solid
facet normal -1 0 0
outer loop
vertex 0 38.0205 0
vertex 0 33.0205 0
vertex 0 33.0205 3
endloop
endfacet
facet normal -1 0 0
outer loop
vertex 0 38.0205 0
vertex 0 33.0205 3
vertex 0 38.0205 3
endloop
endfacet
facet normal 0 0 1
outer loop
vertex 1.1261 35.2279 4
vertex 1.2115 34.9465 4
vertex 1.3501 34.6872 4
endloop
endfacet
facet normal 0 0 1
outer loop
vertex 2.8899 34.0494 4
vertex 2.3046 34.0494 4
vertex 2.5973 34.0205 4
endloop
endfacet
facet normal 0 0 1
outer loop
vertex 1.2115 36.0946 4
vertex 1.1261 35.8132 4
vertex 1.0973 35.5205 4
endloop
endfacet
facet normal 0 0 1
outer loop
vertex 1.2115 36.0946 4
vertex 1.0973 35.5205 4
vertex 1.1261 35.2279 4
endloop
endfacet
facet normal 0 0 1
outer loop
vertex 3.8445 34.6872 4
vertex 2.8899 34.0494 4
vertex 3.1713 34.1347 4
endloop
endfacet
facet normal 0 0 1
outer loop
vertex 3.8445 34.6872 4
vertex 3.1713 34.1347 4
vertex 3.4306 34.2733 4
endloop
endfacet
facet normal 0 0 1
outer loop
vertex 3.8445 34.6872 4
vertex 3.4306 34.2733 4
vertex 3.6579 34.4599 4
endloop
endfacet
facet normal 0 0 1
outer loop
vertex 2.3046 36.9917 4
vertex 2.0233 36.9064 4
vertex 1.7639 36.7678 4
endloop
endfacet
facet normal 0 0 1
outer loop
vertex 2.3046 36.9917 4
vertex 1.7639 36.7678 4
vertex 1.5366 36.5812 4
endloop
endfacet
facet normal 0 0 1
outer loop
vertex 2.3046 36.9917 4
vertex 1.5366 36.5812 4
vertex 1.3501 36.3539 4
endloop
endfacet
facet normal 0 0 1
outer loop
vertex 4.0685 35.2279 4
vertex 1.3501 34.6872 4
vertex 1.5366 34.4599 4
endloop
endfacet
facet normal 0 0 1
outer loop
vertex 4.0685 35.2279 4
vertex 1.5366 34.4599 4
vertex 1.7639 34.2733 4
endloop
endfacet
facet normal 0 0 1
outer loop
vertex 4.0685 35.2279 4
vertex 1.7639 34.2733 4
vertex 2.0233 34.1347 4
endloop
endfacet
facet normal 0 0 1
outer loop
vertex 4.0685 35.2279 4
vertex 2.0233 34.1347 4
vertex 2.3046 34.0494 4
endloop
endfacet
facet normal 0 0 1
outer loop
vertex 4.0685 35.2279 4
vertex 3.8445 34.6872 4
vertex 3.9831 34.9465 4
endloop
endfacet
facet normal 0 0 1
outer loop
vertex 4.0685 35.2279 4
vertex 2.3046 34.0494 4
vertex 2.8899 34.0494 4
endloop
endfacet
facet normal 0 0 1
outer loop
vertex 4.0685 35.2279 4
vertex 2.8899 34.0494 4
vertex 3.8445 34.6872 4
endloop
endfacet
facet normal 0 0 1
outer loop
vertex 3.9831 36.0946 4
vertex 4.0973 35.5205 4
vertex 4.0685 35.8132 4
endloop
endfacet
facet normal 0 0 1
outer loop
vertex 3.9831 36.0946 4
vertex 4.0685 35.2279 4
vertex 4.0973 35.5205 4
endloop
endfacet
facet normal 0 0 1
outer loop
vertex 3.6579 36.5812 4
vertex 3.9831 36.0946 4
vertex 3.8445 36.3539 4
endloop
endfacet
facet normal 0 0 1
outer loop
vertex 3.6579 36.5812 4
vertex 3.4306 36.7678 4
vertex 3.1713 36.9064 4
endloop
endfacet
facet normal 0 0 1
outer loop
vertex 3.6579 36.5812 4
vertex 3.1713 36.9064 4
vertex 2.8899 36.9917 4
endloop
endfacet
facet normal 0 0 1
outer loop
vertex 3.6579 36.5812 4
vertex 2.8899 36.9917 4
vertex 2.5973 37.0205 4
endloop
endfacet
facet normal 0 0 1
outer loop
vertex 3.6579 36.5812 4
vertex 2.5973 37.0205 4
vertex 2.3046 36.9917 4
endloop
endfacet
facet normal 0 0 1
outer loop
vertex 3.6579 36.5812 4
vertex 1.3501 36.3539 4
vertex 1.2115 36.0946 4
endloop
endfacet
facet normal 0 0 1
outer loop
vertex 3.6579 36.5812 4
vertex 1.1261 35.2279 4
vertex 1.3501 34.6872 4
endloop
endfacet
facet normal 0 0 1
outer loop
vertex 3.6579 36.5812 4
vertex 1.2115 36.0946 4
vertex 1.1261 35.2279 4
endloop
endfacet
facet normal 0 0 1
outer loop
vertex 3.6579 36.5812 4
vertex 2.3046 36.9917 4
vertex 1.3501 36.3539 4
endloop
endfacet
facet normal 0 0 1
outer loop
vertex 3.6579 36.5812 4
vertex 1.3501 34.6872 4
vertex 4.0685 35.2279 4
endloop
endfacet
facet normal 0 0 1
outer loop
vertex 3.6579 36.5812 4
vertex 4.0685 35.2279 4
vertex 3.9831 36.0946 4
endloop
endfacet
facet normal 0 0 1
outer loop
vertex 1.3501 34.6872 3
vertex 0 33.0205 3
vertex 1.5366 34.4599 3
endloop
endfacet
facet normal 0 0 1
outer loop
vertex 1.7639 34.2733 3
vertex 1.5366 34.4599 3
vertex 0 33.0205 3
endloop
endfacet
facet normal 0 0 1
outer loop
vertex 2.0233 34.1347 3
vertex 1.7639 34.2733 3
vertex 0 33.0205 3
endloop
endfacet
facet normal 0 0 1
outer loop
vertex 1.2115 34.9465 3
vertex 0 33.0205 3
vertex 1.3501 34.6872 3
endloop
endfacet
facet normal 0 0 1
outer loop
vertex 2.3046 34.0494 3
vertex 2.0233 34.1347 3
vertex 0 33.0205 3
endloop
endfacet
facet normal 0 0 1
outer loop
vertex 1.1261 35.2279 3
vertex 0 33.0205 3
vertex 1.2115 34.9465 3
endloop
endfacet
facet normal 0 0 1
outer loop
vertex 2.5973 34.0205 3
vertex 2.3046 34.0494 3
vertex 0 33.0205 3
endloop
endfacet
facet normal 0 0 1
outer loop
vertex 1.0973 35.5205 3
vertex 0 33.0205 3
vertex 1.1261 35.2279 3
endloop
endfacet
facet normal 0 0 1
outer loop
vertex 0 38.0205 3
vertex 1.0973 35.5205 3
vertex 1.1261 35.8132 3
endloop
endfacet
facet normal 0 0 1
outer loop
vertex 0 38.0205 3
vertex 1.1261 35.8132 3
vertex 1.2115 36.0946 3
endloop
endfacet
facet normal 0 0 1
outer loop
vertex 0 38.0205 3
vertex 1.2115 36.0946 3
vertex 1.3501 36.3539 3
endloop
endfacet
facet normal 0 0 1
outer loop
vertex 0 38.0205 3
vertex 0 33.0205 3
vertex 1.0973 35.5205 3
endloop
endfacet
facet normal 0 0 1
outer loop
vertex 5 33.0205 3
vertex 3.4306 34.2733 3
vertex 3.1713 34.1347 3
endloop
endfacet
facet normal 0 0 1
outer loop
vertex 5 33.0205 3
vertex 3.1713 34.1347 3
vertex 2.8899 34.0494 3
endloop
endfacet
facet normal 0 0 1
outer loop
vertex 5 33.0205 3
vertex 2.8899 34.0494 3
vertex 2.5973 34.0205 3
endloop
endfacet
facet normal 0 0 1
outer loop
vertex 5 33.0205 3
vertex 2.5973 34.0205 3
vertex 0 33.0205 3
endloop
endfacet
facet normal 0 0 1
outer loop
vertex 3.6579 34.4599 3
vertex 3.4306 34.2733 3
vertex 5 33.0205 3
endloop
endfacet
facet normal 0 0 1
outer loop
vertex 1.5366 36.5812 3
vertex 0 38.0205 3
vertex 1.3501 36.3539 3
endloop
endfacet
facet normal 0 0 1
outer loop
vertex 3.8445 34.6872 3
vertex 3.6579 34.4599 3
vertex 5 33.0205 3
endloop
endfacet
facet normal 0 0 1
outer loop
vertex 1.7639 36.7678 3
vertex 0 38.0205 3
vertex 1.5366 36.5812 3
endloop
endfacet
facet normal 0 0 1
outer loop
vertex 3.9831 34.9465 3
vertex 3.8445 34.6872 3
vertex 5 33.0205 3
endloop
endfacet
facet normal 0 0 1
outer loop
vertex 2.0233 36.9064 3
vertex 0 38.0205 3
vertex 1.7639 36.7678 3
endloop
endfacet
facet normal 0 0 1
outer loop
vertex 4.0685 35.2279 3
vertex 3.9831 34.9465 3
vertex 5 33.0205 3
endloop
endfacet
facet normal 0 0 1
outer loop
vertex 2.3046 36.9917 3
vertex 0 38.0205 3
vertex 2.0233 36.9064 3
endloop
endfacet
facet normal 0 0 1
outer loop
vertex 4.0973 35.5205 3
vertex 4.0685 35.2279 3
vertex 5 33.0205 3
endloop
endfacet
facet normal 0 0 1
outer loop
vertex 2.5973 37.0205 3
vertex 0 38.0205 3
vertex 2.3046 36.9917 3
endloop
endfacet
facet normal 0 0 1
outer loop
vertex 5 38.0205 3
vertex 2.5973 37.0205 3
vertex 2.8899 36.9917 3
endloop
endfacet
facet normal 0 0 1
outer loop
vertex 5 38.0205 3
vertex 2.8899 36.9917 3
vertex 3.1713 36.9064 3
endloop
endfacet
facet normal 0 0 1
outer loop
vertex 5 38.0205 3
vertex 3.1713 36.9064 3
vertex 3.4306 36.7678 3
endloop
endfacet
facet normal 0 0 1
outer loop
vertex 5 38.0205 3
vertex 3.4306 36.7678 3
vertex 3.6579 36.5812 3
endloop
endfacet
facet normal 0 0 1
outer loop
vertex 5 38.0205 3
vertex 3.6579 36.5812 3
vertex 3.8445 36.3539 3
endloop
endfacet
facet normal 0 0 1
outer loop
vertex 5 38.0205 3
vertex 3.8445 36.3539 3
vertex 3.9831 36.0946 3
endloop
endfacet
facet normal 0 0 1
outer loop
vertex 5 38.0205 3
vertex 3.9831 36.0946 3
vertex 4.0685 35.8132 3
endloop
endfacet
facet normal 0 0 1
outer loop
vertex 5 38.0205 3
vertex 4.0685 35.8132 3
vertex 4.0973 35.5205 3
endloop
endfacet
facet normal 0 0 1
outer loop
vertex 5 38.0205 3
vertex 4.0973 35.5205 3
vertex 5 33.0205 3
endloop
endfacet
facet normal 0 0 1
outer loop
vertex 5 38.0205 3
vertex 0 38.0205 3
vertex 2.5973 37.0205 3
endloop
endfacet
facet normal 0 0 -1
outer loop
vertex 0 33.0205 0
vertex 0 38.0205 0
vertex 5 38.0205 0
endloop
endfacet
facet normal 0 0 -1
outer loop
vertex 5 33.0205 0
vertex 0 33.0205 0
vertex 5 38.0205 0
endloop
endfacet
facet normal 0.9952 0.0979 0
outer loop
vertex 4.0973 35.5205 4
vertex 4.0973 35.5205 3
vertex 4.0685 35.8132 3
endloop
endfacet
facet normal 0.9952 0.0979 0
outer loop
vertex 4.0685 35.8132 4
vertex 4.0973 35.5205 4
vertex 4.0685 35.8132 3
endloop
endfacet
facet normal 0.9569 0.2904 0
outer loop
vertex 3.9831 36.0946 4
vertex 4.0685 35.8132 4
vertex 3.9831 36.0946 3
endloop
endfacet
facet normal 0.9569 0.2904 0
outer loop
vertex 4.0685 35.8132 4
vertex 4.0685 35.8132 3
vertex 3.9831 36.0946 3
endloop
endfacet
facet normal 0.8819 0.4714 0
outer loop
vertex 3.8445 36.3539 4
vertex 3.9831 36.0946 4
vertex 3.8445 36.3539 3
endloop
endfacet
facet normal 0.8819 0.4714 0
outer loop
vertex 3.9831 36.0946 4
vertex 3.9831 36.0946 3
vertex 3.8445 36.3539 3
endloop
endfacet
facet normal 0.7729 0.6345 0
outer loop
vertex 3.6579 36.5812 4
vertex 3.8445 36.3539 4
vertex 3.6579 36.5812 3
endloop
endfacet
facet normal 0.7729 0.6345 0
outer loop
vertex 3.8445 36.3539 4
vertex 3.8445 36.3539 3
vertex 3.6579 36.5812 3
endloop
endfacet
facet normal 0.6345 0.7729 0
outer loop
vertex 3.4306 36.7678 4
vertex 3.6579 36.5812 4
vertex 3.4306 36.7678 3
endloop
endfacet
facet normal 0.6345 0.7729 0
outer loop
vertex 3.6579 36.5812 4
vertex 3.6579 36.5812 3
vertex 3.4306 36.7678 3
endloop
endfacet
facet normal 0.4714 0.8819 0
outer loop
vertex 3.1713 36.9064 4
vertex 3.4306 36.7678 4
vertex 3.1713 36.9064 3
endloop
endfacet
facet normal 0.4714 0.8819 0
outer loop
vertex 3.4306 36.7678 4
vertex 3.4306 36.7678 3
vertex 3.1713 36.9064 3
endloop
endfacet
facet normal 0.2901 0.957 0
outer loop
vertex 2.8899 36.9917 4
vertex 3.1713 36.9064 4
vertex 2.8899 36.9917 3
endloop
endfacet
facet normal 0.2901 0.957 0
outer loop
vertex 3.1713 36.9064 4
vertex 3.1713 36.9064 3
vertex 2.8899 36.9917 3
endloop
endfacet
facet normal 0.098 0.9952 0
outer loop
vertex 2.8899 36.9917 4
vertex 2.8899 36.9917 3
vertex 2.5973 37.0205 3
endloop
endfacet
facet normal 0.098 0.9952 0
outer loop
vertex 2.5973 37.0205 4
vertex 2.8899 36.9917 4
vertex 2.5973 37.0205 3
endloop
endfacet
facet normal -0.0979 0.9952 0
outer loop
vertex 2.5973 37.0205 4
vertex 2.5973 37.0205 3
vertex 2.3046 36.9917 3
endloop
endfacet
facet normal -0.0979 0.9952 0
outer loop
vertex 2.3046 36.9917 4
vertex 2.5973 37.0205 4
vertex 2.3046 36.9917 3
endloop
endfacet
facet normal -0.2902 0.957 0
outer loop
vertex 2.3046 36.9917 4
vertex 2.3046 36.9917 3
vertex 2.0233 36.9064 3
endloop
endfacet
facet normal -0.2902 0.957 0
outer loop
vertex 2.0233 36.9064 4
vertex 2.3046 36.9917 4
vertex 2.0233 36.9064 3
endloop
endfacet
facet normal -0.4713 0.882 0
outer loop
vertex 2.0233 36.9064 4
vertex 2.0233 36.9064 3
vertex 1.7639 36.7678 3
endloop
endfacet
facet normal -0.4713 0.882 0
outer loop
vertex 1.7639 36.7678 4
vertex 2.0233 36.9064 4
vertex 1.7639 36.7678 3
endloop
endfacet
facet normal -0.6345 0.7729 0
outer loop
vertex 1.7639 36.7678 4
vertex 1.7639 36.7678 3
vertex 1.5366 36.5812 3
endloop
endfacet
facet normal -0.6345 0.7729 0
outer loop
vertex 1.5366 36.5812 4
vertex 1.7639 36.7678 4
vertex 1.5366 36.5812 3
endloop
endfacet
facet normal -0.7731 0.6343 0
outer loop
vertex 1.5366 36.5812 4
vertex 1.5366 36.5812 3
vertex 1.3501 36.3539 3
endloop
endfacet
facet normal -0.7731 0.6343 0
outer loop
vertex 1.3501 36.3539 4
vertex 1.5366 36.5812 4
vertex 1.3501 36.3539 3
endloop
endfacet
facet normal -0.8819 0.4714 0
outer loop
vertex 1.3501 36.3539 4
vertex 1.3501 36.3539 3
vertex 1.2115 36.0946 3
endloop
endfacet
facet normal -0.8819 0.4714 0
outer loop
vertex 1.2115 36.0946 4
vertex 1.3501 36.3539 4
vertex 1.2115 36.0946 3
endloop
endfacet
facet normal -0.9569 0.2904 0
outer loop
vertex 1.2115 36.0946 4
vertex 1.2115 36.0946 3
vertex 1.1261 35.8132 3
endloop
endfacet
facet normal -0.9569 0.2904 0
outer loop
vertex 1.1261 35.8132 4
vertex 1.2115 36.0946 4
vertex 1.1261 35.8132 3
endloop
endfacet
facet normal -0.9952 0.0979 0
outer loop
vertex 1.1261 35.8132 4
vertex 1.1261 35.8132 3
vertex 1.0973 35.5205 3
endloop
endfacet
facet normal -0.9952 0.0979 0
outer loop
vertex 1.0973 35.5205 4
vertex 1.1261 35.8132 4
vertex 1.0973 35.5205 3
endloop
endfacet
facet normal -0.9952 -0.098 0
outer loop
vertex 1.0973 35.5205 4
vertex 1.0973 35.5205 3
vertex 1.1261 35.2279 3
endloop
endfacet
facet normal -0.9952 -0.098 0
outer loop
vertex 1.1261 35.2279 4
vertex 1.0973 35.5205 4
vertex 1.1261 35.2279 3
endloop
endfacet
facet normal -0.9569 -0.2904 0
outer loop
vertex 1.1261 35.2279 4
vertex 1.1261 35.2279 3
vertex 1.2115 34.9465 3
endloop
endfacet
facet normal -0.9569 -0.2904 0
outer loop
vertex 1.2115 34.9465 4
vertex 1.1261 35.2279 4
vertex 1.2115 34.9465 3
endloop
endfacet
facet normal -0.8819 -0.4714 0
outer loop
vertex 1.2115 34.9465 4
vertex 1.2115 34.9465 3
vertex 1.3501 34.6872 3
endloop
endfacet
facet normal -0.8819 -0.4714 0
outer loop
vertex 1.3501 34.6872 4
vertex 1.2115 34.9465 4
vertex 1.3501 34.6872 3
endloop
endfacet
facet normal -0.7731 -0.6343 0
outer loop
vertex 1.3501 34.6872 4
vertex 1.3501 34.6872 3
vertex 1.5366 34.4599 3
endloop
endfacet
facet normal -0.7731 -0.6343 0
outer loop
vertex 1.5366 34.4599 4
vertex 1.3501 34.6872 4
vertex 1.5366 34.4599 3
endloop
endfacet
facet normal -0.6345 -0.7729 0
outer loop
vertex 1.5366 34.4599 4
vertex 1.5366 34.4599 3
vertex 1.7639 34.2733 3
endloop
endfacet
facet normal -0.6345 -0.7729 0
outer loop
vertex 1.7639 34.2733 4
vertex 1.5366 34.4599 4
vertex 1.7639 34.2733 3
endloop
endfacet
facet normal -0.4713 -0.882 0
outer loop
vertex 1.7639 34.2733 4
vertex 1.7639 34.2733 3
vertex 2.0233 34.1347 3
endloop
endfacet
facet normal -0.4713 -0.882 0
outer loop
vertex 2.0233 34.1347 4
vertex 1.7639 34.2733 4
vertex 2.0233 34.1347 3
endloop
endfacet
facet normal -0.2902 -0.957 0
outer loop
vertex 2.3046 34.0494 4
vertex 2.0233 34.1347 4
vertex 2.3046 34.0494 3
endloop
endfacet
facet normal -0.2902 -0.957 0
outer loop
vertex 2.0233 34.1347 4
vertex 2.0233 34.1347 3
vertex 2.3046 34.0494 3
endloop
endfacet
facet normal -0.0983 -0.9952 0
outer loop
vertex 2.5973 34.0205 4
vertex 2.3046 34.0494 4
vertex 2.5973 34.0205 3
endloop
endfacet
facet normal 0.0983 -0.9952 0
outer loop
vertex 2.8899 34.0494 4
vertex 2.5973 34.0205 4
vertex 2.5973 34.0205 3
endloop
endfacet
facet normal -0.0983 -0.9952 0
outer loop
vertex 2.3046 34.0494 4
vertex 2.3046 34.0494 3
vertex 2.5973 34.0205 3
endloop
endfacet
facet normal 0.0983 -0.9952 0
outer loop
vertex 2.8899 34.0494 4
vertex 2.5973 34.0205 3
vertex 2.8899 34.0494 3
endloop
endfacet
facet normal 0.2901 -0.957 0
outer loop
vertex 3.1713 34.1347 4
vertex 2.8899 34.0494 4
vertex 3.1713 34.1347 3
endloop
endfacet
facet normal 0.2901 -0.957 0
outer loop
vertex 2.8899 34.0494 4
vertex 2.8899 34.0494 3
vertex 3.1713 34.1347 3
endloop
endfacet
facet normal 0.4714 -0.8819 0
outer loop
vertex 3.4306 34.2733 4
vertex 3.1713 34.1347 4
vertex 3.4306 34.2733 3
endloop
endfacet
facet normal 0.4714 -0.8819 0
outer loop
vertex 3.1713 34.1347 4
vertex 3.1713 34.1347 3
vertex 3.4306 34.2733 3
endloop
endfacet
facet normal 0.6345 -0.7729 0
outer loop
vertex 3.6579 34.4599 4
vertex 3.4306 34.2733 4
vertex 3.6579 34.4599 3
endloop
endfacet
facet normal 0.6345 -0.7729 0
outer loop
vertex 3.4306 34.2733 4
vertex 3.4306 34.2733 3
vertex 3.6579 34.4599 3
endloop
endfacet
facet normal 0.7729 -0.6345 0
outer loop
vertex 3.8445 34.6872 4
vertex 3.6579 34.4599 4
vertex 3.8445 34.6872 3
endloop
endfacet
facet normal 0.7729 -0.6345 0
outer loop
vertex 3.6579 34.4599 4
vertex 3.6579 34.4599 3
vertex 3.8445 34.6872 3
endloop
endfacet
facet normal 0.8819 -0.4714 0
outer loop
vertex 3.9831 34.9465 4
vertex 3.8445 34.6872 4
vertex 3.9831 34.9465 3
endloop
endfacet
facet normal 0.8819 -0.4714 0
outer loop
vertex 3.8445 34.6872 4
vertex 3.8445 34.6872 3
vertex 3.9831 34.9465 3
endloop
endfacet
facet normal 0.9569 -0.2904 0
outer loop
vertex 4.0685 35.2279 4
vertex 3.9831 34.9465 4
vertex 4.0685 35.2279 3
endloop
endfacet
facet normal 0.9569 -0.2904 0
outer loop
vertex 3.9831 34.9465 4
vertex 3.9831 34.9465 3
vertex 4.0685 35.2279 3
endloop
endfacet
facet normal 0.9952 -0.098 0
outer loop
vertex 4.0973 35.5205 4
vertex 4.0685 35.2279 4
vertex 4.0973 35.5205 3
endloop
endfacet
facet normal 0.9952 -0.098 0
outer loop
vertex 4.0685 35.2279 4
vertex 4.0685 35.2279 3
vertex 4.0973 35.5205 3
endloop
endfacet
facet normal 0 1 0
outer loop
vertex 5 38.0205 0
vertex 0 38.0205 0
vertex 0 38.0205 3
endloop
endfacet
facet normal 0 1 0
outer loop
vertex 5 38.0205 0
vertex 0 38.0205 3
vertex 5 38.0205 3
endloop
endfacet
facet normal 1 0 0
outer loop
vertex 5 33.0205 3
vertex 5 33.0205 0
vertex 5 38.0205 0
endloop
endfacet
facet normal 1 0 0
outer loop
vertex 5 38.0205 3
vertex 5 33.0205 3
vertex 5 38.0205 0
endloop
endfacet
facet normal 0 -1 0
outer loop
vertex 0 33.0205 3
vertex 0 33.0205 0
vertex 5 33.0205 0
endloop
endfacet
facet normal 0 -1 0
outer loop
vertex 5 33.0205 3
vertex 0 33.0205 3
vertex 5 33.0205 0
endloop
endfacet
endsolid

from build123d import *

# Parameters (mm, degrees)
F0_W     = 5
F0_H     = 5
F0_R     = 1.5
F1_DEPTH = 3
F2_DEPTH = 4


with BuildPart() as f1:
    # F0 (on Top) → F1 (new body)
    with BuildSketch(Plane.XY):
        with Locations((2.5, 35.520546)):
            Rectangle(F0_W, F0_H)
        with Locations((2.597283, 35.520546)):
            Circle(F0_R, mode=Mode.SUBTRACT)
        with Locations((2.597283, 35.520546)):
            Circle(F0_R)
    extrude(amount=F1_DEPTH)

    # F0 (on Top) → F2 (join)
    with BuildSketch(Plane.XY):
        with Locations((2.597283, 35.520546)):
            Circle(F0_R)
    extrude(amount=F2_DEPTH)


solid = f1.part
